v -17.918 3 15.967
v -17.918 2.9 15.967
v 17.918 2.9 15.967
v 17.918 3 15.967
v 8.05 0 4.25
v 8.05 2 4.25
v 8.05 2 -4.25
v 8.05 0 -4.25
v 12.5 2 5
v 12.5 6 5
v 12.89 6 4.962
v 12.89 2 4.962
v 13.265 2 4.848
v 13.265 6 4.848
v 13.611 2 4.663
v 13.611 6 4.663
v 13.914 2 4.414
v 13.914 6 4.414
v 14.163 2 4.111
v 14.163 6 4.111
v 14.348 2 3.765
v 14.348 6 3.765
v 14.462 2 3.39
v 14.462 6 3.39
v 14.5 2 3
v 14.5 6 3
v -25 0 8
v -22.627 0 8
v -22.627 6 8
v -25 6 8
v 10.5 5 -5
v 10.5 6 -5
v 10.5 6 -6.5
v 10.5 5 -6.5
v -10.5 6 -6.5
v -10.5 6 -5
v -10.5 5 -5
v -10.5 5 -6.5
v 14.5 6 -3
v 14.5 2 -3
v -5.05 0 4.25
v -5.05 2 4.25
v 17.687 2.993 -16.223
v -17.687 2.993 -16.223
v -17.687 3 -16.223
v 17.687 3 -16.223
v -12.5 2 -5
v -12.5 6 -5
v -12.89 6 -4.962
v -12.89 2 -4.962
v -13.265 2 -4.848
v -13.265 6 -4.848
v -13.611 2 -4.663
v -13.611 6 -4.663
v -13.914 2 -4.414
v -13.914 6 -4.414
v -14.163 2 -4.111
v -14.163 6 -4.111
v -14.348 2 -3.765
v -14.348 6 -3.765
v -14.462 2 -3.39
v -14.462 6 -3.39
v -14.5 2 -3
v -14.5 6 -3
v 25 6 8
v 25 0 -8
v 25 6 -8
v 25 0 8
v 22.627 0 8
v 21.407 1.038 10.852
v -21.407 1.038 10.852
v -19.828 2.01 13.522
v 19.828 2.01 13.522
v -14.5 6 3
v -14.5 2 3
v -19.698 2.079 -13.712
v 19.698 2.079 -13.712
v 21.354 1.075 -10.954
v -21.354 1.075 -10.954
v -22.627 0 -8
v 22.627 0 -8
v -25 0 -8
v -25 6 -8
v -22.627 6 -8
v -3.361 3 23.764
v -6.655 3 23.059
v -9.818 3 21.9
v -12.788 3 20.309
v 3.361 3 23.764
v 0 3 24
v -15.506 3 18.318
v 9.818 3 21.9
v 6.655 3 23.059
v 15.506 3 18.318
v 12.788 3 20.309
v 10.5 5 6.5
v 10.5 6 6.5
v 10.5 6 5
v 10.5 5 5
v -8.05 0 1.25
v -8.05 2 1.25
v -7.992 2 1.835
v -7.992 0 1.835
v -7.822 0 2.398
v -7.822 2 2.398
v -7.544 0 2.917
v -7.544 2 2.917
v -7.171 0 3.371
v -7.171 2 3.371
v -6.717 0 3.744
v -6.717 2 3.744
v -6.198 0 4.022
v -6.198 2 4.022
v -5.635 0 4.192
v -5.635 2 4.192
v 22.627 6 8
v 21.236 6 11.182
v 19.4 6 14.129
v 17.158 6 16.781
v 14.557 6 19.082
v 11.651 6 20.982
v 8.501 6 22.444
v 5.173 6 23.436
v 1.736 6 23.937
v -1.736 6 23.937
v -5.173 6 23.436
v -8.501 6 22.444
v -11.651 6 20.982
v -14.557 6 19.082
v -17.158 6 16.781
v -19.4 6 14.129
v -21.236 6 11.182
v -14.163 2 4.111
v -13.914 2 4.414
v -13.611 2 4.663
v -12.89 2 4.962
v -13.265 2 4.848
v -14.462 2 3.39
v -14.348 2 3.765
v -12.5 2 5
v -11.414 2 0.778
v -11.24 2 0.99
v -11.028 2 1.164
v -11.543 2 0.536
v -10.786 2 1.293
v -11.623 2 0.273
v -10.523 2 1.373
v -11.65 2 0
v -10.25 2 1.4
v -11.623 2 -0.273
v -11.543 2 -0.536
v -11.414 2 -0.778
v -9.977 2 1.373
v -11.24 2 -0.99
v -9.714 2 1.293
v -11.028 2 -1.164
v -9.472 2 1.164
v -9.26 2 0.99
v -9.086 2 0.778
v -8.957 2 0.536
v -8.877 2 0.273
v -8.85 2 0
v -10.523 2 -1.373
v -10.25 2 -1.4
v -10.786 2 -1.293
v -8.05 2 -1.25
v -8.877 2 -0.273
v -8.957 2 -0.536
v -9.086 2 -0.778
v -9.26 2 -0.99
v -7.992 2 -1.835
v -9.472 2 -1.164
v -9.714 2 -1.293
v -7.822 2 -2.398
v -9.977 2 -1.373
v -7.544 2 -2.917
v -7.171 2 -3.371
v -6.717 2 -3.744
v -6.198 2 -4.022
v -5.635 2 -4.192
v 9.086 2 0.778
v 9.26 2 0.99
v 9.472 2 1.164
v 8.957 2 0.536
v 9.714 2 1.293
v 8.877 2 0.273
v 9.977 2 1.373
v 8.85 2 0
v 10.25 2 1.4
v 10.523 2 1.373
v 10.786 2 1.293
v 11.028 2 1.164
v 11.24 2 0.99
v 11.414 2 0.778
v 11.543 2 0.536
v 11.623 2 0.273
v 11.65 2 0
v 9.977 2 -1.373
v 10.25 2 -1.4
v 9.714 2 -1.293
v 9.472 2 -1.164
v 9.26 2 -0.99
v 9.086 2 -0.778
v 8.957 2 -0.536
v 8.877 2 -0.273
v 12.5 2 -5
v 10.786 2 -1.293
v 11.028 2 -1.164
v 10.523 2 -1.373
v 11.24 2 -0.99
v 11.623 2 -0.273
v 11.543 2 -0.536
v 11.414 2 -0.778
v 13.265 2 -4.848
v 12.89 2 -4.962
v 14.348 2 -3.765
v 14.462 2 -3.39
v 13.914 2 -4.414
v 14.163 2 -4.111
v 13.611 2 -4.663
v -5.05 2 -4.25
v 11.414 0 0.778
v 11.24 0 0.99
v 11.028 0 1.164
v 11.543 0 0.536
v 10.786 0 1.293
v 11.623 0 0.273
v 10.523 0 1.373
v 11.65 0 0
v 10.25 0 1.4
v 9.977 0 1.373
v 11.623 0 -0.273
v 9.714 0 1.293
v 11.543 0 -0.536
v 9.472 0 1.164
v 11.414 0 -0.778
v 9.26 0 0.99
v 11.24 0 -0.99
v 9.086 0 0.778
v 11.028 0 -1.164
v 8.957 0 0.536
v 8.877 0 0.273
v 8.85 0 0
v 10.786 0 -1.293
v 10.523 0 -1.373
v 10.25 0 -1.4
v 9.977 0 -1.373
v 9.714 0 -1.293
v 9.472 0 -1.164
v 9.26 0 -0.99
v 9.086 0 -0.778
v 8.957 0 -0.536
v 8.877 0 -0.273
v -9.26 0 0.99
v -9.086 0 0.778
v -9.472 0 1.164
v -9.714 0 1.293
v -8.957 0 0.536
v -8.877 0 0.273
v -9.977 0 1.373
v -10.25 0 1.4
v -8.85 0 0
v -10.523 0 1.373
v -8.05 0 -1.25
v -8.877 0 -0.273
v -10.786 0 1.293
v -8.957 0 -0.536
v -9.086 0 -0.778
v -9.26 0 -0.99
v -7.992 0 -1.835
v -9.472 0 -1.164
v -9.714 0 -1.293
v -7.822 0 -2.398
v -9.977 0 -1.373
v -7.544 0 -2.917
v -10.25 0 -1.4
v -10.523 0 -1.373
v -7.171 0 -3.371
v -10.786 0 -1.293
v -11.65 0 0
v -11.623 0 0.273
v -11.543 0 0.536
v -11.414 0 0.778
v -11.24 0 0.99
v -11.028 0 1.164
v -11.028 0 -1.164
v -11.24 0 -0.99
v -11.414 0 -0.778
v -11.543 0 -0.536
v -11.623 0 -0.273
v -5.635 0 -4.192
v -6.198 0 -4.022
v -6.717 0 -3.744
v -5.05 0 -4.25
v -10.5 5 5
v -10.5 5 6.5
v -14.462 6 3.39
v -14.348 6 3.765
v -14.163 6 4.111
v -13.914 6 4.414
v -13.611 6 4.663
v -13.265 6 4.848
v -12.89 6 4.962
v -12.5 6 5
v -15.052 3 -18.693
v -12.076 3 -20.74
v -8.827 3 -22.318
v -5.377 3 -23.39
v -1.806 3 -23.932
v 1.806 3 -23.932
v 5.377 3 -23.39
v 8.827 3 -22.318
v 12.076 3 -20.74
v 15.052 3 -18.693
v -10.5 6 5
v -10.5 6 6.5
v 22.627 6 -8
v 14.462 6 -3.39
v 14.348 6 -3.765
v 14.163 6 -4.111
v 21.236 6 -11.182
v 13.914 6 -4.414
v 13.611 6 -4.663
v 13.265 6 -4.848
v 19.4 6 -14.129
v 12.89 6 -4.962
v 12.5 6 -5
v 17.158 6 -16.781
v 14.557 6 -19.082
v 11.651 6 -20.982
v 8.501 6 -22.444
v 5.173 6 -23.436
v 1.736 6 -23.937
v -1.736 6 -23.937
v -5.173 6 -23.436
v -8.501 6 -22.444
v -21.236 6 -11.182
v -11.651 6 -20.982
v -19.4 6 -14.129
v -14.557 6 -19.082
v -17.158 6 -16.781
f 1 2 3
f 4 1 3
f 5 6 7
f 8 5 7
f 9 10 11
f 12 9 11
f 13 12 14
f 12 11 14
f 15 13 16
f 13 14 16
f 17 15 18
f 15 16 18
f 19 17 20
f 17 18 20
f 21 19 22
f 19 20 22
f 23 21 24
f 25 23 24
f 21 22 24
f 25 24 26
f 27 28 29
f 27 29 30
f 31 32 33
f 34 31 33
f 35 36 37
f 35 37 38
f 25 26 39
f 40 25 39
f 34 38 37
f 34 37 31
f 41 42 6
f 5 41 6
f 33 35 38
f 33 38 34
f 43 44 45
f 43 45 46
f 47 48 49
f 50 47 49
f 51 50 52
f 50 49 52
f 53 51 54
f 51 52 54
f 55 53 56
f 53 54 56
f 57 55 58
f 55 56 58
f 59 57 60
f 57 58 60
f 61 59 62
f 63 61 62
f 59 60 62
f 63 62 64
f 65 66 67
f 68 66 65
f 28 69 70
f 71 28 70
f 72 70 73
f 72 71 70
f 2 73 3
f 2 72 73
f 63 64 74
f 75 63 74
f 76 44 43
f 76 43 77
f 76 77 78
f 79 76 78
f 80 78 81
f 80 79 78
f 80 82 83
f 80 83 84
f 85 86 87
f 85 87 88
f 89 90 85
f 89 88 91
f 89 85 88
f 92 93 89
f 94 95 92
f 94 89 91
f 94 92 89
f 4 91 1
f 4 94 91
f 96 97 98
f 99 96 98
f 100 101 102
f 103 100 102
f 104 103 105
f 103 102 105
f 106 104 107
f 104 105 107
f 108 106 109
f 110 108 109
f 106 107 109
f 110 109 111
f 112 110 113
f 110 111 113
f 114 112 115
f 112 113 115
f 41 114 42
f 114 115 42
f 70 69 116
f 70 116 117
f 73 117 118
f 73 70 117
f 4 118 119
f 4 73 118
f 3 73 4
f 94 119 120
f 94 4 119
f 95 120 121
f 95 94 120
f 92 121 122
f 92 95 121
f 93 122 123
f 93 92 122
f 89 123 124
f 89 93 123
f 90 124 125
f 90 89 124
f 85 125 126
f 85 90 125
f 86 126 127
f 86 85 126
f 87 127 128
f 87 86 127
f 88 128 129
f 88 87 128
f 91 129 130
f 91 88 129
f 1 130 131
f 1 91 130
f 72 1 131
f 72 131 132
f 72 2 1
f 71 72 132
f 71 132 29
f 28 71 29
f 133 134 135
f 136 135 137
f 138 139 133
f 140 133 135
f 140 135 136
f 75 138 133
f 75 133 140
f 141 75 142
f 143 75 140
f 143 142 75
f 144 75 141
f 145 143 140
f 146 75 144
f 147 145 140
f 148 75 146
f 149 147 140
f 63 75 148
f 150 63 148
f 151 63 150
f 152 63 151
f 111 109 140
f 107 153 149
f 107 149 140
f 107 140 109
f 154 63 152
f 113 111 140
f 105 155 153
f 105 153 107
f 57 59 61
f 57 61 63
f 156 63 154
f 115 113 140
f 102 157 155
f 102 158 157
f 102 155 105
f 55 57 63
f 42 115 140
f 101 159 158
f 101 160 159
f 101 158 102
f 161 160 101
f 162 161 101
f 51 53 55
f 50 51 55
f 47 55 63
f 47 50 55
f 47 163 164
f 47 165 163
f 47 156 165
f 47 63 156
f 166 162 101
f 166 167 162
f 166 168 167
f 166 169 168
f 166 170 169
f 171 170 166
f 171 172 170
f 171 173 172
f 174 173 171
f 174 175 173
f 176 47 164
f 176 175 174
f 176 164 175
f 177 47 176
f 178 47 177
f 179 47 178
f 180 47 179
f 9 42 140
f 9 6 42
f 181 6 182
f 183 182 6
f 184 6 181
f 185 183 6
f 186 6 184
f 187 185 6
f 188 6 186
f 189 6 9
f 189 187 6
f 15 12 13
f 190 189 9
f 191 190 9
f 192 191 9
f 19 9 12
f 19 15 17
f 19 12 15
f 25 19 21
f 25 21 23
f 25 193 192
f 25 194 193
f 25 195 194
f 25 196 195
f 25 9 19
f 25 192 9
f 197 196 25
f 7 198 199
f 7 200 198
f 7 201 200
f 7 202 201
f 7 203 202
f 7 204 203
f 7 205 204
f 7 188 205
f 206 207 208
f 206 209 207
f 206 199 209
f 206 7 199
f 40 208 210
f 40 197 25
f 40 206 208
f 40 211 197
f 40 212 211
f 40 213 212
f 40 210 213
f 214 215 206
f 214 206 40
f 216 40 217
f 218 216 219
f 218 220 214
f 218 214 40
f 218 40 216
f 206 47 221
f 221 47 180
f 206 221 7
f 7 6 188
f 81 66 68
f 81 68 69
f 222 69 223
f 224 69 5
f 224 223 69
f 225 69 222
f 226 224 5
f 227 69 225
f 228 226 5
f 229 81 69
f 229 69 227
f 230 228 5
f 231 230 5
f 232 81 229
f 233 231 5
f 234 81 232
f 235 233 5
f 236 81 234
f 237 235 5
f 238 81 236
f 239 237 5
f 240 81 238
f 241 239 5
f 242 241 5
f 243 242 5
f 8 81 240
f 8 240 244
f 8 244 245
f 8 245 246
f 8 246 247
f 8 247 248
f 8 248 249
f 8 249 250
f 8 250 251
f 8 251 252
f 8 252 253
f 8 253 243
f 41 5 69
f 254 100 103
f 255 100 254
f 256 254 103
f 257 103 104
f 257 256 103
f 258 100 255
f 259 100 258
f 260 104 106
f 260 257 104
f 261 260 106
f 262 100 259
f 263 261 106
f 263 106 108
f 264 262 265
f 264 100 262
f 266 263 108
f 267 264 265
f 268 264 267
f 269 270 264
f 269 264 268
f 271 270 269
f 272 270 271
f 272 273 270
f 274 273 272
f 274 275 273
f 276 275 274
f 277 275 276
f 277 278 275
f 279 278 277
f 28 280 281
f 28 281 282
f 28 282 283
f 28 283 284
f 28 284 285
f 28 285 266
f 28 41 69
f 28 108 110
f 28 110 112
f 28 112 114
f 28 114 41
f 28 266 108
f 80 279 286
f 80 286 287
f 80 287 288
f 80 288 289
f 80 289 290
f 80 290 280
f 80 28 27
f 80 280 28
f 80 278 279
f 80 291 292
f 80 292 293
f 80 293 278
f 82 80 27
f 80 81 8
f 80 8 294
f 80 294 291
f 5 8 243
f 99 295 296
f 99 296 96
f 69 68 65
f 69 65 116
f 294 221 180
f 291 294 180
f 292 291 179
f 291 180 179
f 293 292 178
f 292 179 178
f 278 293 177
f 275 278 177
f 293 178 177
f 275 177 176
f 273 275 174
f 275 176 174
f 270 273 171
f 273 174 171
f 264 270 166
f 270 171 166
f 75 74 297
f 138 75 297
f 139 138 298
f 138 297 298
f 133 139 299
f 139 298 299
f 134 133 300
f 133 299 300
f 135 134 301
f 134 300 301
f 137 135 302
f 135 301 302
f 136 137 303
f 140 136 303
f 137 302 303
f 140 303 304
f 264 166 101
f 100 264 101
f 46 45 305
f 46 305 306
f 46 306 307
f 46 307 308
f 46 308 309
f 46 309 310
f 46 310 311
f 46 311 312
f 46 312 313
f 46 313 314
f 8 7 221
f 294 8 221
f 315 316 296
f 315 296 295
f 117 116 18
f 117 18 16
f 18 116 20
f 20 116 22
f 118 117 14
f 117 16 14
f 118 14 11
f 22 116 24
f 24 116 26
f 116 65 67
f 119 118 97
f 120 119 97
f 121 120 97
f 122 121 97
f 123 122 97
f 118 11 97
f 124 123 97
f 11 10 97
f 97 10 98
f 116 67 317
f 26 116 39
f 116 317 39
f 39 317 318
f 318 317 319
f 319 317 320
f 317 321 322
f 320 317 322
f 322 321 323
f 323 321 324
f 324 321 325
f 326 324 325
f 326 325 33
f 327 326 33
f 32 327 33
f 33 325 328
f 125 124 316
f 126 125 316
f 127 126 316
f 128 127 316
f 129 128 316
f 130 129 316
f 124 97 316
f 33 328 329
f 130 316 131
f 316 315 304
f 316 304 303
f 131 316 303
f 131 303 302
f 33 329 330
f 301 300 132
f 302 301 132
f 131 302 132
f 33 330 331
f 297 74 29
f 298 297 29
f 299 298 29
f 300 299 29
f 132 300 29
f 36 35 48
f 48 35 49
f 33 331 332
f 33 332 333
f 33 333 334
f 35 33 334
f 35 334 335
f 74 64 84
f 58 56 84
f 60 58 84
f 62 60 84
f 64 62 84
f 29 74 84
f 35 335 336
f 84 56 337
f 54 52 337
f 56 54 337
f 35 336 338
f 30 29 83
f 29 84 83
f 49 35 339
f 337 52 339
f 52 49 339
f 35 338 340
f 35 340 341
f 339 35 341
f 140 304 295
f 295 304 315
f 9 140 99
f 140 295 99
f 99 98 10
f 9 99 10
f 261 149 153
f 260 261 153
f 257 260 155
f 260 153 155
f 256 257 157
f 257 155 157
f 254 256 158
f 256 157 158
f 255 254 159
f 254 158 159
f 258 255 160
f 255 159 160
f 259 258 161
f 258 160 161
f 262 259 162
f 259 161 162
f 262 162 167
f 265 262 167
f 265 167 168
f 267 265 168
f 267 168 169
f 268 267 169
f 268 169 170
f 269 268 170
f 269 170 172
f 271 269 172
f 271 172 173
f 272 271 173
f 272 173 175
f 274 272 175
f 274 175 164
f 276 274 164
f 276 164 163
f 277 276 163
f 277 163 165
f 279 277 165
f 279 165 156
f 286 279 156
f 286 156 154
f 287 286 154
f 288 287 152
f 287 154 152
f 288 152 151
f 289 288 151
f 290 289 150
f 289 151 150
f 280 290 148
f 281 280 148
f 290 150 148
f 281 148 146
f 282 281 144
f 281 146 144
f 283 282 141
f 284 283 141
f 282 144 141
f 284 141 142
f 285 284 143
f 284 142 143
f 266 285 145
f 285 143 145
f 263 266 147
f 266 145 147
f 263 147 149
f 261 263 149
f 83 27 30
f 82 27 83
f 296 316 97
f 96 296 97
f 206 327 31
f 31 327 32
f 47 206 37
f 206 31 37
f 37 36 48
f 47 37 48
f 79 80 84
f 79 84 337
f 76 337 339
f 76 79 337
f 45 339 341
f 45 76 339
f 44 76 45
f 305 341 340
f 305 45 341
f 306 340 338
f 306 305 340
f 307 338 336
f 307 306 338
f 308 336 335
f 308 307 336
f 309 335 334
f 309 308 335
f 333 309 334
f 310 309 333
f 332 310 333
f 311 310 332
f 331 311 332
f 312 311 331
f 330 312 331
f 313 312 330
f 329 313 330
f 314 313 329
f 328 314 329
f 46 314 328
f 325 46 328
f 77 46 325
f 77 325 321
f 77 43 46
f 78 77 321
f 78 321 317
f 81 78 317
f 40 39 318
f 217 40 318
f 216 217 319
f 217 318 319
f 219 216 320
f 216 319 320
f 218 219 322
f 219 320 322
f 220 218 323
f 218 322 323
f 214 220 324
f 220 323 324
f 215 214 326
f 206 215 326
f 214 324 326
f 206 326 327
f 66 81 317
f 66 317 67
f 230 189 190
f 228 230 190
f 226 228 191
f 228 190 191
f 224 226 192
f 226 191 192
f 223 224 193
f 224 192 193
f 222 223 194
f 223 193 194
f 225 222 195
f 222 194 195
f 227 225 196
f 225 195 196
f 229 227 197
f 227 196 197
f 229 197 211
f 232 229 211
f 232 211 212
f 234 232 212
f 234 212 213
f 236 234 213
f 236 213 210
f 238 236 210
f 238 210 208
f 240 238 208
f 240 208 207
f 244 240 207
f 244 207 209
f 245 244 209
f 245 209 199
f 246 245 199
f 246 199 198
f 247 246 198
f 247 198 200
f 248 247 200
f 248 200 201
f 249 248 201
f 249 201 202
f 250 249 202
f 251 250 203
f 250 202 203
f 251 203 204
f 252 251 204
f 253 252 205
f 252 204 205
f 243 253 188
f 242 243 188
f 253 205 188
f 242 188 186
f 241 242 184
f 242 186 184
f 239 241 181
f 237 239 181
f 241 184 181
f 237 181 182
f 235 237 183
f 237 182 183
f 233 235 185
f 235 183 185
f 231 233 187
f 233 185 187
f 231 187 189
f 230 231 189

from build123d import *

# Parameters (mm, degrees)
BOSS_EXTRUDE1_DEPTH = 6
CUT_EXTRUDE1_DEPTH  = 10
CUT_EXTRUDE2_DEPTH  = 4
SKETCH4_W           = 21
SKETCH4_H           = 13
CUT_EXTRUDE3_DEPTH  = 1
SKETCH5_R           = 1.4
CUT_EXTRUDE4_DEPTH  = 10
CUT_EXTRUDE8_START  = -22.627416998
CUT_EXTRUDE8_DEPTH  = 45.254833996
SKETCH8_W           = 50.670468249
SKETCH8_H           = 10.499687698
SKETCH8_W_2         = 48.947034964
SKETCH8_H_2         = 10.380689976
CUT_EXTRUDE9_DEPTH  = 3


# Read off the part's stored shape, not the designer's step: Cut-Extrude8
with BuildPart() as part:
    # Sketch1 → Boss-Extrude1 (new body)
    with BuildSketch(Plane(origin=(0, 0, 0), x_dir=(1, 0, 0), z_dir=(0, 1, 0))):
        with BuildLine():
            Line((22.627416998, 8), (25, 8))
            Line((25, 8), (25, -8))
            Line((25, -8), (22.627416998, -8))
            ThreePointArc((22.627416998, -8), (0, -24), (-22.627416998, -8))
            Line((-22.627416998, -8), (-25, -8))
            Line((-25, -8), (-25, 8))
            Line((-25, 8), (-22.627416998, 8))
            ThreePointArc((-22.627416998, 8), (0, 24), (22.627416998, 8))
        make_face()
    extrude(amount=BOSS_EXTRUDE1_DEPTH)

    # Sketch2 → Cut-Extrude1 (cut)
    with BuildSketch(Plane(origin=(0, 6, 0), x_dir=(1, 0, 0), z_dir=(0, 1, 0))):
        with BuildLine():
            Line((-5.05, -4.25), (8.05, -4.25))
            Line((8.05, -4.25), (8.05, 4.25))
            Line((8.05, 4.25), (-5.05, 4.25))
            ThreePointArc((-5.05, 4.25), (-7.171320344, 3.371320344), (-8.05, 1.25))
            Line((-8.05, 1.25), (-8.05, -1.25))
            ThreePointArc((-8.05, -1.25), (-7.171320344, -3.371320344), (-5.05, -4.25))
        make_face()
    extrude(amount=-CUT_EXTRUDE1_DEPTH, mode=Mode.SUBTRACT)

    # Sketch3 → Cut-Extrude2 (cut)
    with BuildSketch(Plane(origin=(0, 6, 0), x_dir=(1, 0, 0), z_dir=(0, 1, 0))):
        with BuildLine():
            Line((-12.5, -5), (12.5, -5))
            ThreePointArc((12.5, -5), (13.914213562, -4.414213562), (14.5, -3))
            Line((14.5, -3), (14.5, 3))
            ThreePointArc((14.5, 3), (13.914213562, 4.414213562), (12.5, 5))
            Line((12.5, 5), (-12.5, 5))
            ThreePointArc((-12.5, 5), (-13.914213562, 4.414213562), (-14.5, 3))
            Line((-14.5, 3), (-14.5, -3))
            ThreePointArc((-14.5, -3), (-13.914213562, -4.414213562), (-12.5, -5))
        make_face()
    extrude(amount=-CUT_EXTRUDE2_DEPTH, mode=Mode.SUBTRACT)

    # Sketch4 → Cut-Extrude3 (cut)
    with BuildSketch(Plane(origin=(0, 6, 0), x_dir=(1, 0, 0), z_dir=(0, 1, 0))):
        Rectangle(SKETCH4_W, SKETCH4_H)
    extrude(amount=-CUT_EXTRUDE3_DEPTH, mode=Mode.SUBTRACT)

    # Sketch5 → Cut-Extrude4 (cut)
    with BuildSketch(Plane(origin=(0, 2, 0), x_dir=(1, 0, 0), z_dir=(0, 1, 0))):
        with Locations(Location((-10.25, 0, 0), (0, 0, 270))):
            Circle(SKETCH5_R)
        with Locations(Location((10.25, 0, 0), (0, 0, 270))):
            Circle(SKETCH5_R)
    extrude(amount=-CUT_EXTRUDE4_DEPTH, mode=Mode.SUBTRACT)

    # Cut-Extrude8 outline → Cut-Extrude8 (cut)
    with BuildSketch(Plane.YZ.offset(CUT_EXTRUDE8_START)):
        Polygon((0, -24.445099732), (0.162003054, -24), (2.992763401, -16.222549867), (0, -8), align=None)
        Polygon((0, 23.933160472), (0, 8), (2.899598075, 15.966580236), align=None)
    extrude(amount=CUT_EXTRUDE8_DEPTH, mode=Mode.SUBTRACT)

    # Sketch8 → Cut-Extrude9 (cut)
    with BuildSketch(Plane.XZ):
        with Locations((1.133817479, 21.216424085)):
            Rectangle(SKETCH8_W, SKETCH8_H)
        with Locations((0.272100837, -21.412894855)):
            Rectangle(SKETCH8_W_2, SKETCH8_H_2)
    extrude(amount=-CUT_EXTRUDE9_DEPTH, mode=Mode.SUBTRACT)


solid = part.part
